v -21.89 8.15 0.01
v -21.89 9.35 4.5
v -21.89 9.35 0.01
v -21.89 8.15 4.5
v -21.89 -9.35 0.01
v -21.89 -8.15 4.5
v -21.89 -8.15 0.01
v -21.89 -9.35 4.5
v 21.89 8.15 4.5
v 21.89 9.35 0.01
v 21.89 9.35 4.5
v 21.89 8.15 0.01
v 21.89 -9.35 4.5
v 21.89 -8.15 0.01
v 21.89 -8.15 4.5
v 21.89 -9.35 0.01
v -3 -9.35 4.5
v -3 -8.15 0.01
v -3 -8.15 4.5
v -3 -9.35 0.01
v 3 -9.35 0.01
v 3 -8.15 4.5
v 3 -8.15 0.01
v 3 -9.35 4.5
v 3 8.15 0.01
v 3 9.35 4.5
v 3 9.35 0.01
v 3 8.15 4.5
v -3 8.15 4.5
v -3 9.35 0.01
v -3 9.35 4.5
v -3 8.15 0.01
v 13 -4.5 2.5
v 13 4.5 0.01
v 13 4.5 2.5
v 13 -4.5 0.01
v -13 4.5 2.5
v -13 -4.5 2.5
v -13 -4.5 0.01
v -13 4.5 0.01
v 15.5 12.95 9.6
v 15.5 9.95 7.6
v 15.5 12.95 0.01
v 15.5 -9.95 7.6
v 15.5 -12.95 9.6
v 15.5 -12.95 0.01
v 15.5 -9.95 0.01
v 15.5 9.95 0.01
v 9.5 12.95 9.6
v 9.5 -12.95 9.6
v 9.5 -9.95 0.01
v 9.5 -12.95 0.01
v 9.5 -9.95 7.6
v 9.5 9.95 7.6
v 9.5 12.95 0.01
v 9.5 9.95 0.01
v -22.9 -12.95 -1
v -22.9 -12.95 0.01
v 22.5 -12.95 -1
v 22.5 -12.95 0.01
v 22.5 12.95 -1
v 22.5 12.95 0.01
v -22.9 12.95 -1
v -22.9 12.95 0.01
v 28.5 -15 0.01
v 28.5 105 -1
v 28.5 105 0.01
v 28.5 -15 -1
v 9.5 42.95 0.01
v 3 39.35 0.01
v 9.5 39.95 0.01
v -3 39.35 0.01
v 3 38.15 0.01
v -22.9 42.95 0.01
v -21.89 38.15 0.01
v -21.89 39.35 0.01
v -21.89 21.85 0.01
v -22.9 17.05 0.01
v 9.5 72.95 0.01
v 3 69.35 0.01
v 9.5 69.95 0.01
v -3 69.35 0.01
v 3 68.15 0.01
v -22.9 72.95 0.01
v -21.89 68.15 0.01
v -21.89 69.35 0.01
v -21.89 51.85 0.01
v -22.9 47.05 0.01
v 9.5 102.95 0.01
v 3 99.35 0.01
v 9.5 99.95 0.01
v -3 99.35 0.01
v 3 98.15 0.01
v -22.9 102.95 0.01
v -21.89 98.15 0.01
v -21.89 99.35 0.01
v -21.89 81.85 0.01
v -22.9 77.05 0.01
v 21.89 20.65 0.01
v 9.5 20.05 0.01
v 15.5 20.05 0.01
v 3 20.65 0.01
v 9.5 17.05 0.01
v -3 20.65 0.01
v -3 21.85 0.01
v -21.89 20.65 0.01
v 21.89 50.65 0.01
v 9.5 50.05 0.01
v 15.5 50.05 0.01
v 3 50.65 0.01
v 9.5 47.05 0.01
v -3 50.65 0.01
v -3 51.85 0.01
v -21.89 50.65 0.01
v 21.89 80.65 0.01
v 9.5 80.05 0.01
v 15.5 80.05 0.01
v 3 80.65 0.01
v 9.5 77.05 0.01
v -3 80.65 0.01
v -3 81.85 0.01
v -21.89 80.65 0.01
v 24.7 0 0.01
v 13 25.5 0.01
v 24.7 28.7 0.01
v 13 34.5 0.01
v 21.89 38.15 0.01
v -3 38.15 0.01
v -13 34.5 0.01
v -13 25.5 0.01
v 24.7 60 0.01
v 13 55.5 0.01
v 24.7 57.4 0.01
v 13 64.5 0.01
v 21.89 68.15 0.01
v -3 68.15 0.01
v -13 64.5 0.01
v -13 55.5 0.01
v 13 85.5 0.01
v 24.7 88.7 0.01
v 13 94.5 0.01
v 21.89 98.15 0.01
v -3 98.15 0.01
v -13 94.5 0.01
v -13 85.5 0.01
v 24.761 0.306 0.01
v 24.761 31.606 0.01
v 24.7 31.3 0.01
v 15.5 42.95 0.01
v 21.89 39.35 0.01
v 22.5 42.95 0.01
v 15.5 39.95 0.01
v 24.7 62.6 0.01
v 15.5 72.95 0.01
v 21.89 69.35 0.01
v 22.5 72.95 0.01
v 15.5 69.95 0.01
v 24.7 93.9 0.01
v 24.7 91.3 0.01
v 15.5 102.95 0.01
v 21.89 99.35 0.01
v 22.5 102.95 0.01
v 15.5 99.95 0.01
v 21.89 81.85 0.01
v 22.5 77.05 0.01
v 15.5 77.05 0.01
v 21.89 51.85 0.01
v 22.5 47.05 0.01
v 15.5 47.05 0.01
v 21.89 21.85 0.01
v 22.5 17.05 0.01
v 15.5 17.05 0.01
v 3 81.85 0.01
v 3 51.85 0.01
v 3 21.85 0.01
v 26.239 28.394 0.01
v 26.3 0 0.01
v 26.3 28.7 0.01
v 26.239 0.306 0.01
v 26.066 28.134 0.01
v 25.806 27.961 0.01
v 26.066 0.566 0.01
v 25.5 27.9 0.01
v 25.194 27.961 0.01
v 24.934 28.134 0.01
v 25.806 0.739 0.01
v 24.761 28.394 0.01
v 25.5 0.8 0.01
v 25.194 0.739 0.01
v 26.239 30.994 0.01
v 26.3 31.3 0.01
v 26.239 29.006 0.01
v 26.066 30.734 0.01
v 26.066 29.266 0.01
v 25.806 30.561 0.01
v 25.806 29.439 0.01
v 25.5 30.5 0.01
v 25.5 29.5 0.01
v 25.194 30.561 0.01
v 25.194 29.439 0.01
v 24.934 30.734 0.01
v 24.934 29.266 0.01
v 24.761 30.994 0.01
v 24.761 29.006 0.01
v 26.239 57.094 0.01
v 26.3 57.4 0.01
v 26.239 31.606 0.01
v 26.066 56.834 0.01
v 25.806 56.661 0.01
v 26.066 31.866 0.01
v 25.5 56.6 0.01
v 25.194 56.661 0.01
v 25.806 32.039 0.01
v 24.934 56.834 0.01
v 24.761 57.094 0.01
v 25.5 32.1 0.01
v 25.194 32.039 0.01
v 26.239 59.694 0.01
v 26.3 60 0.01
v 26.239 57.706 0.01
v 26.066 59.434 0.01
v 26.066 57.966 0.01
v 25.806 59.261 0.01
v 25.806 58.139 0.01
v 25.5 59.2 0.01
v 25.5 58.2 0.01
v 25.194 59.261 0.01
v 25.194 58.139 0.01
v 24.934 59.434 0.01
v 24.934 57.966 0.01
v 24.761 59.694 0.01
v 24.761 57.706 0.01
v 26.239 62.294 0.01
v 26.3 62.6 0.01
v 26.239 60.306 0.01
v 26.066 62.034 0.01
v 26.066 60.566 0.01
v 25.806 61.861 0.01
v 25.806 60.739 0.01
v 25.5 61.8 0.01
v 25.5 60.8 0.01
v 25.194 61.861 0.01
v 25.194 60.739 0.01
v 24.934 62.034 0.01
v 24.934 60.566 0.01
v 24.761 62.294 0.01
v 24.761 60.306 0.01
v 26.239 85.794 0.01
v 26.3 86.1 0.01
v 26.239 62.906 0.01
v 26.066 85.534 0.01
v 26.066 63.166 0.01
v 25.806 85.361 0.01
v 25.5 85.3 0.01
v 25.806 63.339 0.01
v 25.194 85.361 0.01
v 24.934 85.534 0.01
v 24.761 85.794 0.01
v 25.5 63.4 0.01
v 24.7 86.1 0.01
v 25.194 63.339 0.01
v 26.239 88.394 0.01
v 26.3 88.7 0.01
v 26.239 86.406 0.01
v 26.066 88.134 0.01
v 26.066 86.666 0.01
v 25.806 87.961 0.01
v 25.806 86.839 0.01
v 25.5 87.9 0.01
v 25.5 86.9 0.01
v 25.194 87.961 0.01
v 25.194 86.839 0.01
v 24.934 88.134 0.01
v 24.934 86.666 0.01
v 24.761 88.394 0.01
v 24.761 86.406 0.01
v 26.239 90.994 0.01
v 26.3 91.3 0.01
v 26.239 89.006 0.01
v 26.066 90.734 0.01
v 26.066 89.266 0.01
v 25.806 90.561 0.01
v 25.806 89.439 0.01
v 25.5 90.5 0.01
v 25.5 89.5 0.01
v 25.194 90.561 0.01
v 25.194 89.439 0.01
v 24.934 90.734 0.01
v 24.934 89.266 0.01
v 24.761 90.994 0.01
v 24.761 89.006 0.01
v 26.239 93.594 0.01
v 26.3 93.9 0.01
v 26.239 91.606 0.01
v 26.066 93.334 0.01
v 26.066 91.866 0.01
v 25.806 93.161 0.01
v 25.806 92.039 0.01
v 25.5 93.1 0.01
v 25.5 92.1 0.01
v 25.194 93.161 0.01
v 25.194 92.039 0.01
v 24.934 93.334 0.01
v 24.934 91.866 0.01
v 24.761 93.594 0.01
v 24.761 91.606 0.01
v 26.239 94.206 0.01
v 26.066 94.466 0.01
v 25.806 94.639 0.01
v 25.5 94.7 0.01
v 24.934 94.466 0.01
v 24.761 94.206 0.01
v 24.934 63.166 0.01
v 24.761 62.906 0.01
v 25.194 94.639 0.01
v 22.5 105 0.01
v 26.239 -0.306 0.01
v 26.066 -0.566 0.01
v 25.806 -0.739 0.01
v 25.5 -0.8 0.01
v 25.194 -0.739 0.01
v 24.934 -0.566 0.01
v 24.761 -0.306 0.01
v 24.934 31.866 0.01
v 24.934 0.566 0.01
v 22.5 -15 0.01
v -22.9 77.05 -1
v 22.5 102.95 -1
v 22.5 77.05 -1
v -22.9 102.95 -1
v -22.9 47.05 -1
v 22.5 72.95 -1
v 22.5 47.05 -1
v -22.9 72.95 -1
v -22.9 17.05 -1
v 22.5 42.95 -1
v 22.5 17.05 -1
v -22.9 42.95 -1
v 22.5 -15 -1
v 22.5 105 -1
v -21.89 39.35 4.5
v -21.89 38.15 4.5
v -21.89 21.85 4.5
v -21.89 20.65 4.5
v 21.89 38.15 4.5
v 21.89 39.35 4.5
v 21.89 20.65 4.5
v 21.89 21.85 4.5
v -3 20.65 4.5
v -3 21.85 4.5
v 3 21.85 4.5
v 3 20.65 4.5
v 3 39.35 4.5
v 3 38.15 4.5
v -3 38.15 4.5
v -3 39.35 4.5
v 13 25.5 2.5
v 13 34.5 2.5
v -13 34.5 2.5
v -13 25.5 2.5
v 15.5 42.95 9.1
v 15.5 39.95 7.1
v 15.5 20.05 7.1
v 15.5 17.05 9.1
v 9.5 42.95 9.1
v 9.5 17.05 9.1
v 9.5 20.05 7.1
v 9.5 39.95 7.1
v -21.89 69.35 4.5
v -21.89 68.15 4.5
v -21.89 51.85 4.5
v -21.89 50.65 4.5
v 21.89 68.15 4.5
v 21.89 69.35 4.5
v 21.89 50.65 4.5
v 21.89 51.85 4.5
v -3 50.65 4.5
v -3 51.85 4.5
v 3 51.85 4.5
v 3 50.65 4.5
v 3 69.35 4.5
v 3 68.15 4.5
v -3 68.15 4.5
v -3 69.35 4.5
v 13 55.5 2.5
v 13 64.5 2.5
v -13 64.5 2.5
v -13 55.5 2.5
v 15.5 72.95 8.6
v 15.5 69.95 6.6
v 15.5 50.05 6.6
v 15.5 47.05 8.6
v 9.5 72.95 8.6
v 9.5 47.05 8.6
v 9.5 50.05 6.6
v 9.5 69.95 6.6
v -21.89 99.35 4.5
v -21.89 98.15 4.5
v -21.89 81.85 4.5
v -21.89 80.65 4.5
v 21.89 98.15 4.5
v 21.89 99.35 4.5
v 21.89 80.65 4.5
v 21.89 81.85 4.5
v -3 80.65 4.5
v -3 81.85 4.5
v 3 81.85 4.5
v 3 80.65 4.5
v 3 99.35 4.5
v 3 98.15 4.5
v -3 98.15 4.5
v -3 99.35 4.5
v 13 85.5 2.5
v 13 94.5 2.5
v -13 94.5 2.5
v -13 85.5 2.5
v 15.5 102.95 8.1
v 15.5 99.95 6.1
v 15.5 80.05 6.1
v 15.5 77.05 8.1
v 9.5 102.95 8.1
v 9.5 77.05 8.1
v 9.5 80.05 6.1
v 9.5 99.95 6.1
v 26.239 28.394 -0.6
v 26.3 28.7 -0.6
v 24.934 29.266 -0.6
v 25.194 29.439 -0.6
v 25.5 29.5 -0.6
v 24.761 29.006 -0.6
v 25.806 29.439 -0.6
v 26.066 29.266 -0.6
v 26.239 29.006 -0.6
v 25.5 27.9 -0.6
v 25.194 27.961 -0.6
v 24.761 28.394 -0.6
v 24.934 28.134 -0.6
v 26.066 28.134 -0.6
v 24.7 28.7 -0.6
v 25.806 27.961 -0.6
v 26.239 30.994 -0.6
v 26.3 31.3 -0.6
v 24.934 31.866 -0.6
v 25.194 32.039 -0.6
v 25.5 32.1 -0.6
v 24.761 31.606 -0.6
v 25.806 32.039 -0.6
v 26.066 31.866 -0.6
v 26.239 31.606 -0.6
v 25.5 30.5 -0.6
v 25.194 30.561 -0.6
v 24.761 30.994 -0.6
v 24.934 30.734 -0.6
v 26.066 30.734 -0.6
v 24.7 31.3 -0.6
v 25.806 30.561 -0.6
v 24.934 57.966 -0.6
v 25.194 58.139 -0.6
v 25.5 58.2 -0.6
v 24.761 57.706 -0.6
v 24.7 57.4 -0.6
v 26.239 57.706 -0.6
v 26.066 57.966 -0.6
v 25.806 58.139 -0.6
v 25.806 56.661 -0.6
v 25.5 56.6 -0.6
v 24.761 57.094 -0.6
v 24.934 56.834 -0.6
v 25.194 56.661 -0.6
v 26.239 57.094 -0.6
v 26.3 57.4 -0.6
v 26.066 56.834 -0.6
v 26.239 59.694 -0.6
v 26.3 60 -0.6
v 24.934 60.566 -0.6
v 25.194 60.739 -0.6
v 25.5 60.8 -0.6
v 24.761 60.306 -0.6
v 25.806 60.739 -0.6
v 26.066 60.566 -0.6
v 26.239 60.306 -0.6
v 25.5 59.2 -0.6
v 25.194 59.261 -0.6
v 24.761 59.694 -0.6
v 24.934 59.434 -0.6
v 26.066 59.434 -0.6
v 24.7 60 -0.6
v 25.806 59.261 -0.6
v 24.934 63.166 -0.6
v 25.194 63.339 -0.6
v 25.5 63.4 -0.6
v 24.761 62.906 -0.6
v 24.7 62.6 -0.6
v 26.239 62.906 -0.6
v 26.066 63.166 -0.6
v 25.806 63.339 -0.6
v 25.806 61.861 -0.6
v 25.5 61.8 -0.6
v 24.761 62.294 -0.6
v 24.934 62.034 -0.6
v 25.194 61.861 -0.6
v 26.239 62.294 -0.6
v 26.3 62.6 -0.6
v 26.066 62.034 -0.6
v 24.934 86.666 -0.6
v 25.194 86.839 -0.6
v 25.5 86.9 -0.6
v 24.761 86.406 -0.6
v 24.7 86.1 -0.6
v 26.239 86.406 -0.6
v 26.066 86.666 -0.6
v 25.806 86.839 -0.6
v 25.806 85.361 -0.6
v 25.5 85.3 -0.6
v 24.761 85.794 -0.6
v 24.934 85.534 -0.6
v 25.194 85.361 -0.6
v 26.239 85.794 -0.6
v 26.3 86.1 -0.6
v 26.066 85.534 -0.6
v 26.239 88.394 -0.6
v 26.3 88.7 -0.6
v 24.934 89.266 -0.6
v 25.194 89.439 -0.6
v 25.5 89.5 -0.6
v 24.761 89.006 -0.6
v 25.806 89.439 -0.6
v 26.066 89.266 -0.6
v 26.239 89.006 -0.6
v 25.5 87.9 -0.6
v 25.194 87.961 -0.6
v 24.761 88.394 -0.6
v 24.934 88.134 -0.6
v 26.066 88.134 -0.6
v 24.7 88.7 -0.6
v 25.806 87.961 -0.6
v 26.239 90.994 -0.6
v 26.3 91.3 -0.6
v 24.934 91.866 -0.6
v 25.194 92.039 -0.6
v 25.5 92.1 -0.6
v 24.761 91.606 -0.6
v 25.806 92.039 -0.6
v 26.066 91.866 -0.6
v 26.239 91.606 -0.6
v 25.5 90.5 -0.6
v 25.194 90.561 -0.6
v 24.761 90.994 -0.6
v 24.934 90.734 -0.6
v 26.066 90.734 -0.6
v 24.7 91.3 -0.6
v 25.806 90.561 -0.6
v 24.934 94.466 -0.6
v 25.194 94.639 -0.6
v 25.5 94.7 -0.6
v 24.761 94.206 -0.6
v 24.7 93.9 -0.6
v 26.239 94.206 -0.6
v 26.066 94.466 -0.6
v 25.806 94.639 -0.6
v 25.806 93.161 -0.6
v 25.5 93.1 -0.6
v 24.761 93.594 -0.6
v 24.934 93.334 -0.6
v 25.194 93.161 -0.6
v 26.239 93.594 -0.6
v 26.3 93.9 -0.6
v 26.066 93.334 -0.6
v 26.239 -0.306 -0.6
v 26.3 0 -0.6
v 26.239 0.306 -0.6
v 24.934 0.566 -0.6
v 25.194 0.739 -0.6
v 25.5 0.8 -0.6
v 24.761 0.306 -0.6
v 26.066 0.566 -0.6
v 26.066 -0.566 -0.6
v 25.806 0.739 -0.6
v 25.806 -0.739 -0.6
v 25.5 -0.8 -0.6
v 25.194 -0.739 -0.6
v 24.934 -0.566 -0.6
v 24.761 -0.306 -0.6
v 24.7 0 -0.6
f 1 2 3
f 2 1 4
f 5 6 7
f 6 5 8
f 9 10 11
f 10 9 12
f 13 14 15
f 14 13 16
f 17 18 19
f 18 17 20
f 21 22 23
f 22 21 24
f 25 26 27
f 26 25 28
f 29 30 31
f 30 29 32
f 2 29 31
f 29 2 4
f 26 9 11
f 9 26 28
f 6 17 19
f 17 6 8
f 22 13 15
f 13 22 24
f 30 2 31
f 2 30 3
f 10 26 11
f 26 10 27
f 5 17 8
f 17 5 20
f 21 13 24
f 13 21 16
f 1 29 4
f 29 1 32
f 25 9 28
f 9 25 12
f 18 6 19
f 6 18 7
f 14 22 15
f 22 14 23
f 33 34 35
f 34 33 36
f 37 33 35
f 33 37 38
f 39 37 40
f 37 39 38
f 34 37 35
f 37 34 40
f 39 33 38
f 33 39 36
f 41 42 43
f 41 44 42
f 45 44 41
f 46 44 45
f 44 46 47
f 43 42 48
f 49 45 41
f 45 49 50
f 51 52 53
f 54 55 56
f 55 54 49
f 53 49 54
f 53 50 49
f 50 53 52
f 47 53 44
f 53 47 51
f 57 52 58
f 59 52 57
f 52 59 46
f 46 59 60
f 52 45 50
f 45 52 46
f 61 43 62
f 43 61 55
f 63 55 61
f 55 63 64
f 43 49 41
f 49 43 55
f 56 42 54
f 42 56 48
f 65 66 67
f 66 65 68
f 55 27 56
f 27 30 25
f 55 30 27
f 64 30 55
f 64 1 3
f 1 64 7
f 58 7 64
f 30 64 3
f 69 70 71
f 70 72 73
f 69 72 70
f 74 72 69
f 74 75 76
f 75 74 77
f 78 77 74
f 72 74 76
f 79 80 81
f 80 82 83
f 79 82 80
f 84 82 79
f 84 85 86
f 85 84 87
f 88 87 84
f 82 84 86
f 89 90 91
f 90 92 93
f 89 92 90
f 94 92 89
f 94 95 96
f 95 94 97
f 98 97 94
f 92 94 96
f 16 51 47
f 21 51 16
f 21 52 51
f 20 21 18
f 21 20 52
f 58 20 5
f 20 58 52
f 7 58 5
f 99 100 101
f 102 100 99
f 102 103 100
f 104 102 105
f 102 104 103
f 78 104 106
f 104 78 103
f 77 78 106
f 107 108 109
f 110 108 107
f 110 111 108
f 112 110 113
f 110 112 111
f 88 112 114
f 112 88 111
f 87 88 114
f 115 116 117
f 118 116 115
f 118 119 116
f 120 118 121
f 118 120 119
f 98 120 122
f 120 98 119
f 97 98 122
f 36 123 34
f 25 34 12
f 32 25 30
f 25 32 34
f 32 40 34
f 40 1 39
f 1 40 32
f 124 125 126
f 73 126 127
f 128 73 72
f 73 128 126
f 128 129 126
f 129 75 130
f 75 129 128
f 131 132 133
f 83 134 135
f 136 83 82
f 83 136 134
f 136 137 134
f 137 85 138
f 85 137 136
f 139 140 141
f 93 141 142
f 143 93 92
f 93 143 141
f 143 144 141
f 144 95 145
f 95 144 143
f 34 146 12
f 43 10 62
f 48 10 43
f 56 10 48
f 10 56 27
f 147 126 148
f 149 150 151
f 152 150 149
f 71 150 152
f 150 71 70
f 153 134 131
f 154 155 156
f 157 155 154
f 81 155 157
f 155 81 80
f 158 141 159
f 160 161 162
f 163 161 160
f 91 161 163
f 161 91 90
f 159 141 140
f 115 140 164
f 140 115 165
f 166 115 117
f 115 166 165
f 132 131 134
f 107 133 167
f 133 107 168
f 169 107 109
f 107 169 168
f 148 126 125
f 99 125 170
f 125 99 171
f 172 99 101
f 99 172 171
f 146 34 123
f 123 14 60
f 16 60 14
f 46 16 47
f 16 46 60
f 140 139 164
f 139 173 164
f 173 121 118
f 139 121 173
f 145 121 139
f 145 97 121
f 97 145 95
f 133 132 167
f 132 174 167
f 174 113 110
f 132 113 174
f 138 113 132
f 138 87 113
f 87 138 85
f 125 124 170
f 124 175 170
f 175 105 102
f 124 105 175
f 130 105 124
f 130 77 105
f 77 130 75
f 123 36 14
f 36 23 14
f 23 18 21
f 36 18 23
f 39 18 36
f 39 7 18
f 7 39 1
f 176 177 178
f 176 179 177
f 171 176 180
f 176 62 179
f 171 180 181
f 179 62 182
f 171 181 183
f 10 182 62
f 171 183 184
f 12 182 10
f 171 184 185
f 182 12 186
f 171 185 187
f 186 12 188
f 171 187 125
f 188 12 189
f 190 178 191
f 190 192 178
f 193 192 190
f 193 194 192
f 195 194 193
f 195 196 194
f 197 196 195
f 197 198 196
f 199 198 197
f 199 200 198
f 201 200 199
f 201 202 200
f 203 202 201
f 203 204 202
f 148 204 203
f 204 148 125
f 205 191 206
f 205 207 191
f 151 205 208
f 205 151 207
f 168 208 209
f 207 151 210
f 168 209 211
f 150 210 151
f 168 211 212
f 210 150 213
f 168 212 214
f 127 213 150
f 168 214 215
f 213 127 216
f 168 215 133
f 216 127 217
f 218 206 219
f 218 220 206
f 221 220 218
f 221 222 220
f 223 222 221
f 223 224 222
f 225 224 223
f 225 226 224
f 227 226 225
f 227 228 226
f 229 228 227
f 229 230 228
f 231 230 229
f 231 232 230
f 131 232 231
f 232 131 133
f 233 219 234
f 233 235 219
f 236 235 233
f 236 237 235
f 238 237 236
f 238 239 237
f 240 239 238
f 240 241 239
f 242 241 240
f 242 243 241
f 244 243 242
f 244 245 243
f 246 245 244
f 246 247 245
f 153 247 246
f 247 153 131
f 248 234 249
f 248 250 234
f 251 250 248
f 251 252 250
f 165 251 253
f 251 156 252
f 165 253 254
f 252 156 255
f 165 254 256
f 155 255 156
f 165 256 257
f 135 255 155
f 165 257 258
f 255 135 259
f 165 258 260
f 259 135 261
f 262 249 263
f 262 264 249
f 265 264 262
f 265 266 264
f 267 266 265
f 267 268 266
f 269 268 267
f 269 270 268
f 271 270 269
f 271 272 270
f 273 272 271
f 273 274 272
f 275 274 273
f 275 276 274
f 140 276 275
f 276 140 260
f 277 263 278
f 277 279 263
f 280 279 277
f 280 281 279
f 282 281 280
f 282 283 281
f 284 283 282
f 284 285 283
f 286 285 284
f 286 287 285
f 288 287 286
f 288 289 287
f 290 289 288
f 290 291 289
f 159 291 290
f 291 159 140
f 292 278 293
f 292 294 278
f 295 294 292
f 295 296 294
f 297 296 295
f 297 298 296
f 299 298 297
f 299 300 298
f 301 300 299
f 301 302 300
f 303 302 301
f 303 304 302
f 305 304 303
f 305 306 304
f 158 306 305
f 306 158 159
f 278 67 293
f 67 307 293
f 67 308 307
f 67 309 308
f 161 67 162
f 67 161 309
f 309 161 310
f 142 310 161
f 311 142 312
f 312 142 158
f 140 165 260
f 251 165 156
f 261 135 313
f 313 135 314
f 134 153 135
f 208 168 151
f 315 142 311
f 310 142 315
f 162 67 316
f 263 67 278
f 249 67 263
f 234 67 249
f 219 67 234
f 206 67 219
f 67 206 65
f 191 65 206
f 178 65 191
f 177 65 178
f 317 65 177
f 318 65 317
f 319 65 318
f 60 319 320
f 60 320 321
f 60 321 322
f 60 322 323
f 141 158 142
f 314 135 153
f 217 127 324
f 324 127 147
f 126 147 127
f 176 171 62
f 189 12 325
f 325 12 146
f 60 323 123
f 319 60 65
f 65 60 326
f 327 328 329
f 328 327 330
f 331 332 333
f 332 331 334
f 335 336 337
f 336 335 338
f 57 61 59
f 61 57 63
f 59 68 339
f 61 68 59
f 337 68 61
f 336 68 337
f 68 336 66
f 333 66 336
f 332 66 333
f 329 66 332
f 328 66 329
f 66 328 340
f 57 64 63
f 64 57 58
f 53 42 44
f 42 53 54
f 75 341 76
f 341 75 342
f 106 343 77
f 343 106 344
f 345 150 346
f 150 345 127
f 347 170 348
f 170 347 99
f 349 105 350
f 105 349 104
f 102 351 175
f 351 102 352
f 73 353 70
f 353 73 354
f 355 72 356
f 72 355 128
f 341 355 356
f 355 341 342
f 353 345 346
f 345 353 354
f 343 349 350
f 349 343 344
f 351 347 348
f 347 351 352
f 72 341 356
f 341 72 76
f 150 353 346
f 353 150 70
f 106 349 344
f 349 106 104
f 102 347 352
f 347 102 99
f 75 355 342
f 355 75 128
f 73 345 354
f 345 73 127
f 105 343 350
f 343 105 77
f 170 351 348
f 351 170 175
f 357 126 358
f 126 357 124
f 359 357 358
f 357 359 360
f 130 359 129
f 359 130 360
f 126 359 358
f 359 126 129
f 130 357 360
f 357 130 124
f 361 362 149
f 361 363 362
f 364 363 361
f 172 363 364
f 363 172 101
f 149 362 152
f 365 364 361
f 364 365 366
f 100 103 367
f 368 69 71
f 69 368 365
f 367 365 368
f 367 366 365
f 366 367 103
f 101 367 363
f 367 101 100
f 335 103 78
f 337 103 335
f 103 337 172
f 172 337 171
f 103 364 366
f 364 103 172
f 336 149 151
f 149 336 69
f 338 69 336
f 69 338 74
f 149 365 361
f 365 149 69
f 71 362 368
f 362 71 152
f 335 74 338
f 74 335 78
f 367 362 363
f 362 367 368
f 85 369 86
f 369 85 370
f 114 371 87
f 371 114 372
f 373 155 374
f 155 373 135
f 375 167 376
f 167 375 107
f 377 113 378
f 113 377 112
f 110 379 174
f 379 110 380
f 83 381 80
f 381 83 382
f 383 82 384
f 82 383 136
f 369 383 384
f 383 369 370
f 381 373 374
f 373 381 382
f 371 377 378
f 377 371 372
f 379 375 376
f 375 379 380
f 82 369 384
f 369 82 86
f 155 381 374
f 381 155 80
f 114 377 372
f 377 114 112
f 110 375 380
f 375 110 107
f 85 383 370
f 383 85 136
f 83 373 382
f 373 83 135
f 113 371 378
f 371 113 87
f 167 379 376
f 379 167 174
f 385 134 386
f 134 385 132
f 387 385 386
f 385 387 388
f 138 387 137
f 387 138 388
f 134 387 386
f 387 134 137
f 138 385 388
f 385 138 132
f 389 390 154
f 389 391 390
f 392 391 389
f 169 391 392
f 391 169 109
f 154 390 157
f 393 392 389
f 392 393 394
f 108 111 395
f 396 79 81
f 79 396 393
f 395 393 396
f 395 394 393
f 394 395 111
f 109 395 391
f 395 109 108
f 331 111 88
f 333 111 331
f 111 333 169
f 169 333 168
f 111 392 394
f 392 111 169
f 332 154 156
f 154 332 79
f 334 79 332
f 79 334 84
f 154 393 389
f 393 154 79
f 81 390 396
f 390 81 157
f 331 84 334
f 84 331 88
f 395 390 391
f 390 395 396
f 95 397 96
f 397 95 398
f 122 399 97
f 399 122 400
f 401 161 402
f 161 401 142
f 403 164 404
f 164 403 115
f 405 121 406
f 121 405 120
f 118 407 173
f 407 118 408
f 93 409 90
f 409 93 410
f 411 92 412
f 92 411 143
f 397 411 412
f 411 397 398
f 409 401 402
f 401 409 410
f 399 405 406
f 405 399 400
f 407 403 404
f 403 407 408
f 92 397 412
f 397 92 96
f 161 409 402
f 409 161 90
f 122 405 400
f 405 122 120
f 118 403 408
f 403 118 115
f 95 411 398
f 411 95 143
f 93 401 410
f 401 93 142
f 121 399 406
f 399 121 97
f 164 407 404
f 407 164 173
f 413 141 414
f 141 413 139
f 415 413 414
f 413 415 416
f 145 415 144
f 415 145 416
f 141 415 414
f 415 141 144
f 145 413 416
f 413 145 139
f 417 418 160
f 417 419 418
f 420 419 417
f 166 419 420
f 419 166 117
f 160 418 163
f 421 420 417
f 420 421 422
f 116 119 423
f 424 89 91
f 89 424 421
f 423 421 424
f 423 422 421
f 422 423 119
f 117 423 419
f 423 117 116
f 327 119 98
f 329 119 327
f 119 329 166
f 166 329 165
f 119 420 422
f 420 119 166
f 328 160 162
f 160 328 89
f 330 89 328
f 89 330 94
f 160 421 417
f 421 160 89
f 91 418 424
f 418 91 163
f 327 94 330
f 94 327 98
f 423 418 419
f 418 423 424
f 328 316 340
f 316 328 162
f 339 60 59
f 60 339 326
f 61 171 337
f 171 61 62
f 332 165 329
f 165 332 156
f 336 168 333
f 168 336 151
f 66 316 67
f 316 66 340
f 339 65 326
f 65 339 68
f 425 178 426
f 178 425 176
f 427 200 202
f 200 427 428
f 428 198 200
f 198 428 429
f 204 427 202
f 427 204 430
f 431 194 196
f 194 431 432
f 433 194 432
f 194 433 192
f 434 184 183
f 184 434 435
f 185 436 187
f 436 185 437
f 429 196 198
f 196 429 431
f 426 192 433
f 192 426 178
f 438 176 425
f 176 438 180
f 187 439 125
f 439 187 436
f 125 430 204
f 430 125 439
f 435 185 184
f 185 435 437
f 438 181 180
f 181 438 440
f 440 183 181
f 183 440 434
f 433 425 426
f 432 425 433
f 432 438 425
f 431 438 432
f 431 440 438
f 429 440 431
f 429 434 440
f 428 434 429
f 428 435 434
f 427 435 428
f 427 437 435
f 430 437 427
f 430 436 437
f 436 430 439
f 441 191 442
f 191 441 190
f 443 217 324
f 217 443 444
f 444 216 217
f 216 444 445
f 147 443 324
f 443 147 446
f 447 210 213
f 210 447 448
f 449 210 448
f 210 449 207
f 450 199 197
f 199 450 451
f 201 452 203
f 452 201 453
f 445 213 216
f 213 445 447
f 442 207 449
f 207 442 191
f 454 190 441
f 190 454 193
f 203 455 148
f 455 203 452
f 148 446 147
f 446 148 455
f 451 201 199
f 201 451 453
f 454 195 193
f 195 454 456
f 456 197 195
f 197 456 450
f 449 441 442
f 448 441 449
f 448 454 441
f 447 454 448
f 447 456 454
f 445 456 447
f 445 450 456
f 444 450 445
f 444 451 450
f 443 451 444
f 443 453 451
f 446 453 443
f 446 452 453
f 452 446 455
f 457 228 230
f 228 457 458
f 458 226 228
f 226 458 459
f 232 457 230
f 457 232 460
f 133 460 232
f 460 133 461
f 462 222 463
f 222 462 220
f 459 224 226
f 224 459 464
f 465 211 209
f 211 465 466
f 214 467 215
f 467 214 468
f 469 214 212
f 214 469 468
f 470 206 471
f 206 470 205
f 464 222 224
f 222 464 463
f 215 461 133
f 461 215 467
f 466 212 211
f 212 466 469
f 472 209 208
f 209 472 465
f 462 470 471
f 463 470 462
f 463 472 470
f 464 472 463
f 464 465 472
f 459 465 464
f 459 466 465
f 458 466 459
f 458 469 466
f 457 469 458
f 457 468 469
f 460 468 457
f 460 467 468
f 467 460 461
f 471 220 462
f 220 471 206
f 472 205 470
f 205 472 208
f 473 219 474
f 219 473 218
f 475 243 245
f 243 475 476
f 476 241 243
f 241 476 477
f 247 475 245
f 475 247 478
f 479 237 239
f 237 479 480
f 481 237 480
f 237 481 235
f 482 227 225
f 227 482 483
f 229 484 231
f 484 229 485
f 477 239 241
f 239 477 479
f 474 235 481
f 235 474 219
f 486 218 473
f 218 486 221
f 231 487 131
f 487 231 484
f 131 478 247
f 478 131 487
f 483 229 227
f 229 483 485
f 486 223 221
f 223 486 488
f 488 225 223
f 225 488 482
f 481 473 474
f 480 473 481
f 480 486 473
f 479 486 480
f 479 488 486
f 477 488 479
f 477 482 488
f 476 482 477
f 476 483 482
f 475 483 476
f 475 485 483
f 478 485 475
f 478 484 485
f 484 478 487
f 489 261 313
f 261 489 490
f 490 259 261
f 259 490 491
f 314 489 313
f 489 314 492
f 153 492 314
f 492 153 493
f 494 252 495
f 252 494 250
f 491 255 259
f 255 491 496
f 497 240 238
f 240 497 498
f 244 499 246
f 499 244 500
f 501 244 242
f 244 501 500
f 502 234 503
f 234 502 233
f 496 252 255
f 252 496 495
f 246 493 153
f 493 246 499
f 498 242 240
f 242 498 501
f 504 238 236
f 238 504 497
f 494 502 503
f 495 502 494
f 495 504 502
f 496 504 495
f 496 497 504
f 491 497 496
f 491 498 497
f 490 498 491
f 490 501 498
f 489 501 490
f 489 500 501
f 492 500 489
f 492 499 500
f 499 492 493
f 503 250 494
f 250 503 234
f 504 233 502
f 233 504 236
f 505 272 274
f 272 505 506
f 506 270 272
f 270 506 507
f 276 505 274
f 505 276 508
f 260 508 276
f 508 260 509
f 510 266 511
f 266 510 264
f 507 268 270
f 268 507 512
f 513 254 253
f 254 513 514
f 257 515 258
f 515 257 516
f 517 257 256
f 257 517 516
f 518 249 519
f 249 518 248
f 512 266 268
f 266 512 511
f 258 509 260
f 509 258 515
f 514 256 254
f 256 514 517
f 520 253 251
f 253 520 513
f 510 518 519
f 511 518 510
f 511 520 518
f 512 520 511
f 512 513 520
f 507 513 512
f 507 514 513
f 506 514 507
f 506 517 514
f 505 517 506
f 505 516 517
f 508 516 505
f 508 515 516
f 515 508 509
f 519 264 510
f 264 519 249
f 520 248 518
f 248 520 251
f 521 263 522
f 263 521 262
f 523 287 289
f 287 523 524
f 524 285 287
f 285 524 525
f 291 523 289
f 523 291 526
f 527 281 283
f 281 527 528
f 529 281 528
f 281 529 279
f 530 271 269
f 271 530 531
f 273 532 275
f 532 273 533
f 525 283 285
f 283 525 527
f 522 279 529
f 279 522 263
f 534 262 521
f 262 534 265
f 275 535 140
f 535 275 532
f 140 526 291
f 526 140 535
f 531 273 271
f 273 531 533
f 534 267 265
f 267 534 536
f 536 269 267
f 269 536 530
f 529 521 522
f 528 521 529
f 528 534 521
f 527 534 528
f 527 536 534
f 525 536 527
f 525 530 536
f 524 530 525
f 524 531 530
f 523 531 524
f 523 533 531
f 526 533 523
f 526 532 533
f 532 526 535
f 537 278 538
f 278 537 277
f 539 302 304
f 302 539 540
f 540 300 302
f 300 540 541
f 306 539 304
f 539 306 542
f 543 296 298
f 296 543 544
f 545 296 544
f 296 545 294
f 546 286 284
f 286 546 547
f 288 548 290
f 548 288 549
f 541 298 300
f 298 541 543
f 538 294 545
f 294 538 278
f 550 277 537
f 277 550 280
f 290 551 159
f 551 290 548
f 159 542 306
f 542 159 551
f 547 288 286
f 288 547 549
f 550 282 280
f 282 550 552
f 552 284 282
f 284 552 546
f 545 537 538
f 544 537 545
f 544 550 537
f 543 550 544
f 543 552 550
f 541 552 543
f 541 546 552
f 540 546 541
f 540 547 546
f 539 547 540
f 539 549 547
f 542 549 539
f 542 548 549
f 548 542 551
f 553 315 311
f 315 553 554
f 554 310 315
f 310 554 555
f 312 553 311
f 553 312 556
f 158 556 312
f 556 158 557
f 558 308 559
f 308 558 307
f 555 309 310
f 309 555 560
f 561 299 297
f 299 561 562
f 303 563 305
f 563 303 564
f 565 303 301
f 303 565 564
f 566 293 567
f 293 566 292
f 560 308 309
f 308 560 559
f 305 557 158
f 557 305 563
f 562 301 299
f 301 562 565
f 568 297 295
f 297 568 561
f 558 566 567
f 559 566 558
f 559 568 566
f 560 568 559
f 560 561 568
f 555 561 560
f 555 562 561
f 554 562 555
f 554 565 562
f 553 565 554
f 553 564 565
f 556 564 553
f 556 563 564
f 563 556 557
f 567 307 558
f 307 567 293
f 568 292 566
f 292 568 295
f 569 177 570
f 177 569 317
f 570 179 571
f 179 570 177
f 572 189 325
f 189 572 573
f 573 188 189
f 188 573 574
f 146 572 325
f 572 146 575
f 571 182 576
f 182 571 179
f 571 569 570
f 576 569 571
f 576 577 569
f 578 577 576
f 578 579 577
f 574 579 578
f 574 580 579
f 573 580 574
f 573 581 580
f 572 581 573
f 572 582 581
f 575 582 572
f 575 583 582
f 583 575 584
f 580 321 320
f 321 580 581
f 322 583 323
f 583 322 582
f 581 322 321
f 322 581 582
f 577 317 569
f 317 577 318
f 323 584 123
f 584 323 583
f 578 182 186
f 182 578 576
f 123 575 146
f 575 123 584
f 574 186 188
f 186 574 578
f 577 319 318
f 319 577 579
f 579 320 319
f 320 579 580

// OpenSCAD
// file: ../board-pocket/board-pocket.scad
//-----------------------------------------------------------------------
// Board pocket: holds a board that has no mounting holes
//
// The board sits on a central pedestal with a pad of double-sided foam tape
// on top, inside a low wall that follows its outline. The pedestal keeps
// the board's edges off the floor, so lead stubs soldered through the edge
// holes have room underneath; gaps in the wall let the leads out. The wall
// only locates the board: the tape holds it down, and in a closed box a lid
// pad presses a pad of foam onto it (boardLidPad below).
//
// Modules, all in the same frame:
//   boardPocketGhost()   the board and its tape, for previews
//   boardPocketHolder()  the plastic: pedestal and outline wall, add to the floor
//   boardLidPad()        a block hanging from the lid that presses foam onto the board
//   boardLidPadGhost()   the foam under it, squashed, for previews
//
// Frame: origin on the floor top, under the centre of the board's outline.
// X along the board's length l, Y across its width w, Z up. Units: mm.
//
// Sides are listed [-X, +X, -Y, +Y], each one of
//   "gap"    wall with a gap in the middle for leads (gapW wide)
//   "solid"  whole wall: use it where the board takes a push (a plug)
//   "open"   no wall: the board's edge goes into a box wall (a USB port)
//
// Used by esp32-c3-supermini, esp32-s3-devkitc and rs485-max485.
//-----------------------------------------------------------------------

//-- From the controller project's receiver.scad / rack-end.scad (boardPocket), 2026-10-30
bpPedestal  = 2.5;     // floor to the tape: room for lead stubs under the board edges
bpTape      = 1.0;     // double-sided foam tape on the pedestal. CAL: how far it squashes
bpWall      = 1.2;     // outline wall thickness
bpRise      = 1.0;     // wall top above the PCB underside (the controller project's rack-end: 0.8 under the S3's module)
bpClearance = 0.4;     // per side, board outline to wall: PETG. 0.3 for PLA. Set by the fit piece
bpGapW      = 6;       // lead gap in a "gap" side
bpPadInset  = 4;       // default pedestal: the board less this all round

//-- Lid hold-down (the controller project's receiver / rack-end lid pads)
bpFoam      = 3.0;     // CAL: self-adhesive foam stuck under each lid pad
bpSqueeze   = 1.0;     // how far the lid squashes it: ~1/3 for soft foam, 0.3 for felt

//-- PCB underside above the floor top
function boardPocketZ(pedestal = bpPedestal, tape = bpTape) = pedestal + tape;
//-- default pedestal [l, w] for a board
function boardPocketPad(l, w, inset = bpPadInset) = [max(l - 2*inset, 4), max(w - 2*inset, 4)];
//-- Z of a lid pad's underside, pressing on a surface at surfaceZ (board top, or a part on it)
function boardLidPadZ(surfaceZ, foam = bpFoam, squeeze = bpSqueeze) =
  assert(squeeze > 0 && squeeze < foam, "foam would not touch the board")
  surfaceZ + foam - squeeze;

function bpSides4(s) = is_list(s) ? s : [s, s, s, s];

module boardPocketGhost(l, w, pcb = 1.6, pad, pedestal = bpPedestal, tape = bpTape)
{
  p = is_undef(pad) ? boardPocketPad(l, w) : pad;
  %color("White") translate([-p[0]/2, -p[1]/2, pedestal]) cube([p[0], p[1], tape]);
  %color("DarkGreen") translate([-l/2, -w/2, pedestal + tape]) cube([l, w, pcb]);
}

//-- pad: pedestal [l, w]; gapW a number or one per side
module boardPocketHolder(l, w, pad, sides = "gap", gapW = bpGapW, clearance = bpClearance,
                         pedestal = bpPedestal, tape = bpTape, wall = bpWall, rise = bpRise)
{
  p   = is_undef(pad) ? boardPocketPad(l, w) : pad;
  s   = bpSides4(sides);
  g   = bpSides4(gapW);
  ix  = l/2 + clearance;                 // inner half sizes
  iy  = w/2 + clearance;
  top = pedestal + tape + rise;
  assert(p[0] <= l && p[1] <= w, "pedestal bigger than the board");
  for (k = s) assert(k == "gap" || k == "solid" || k == "open", str("unknown side ", k));

  //-- pedestal, centred under the board
  translate([-p[0]/2, -p[1]/2, -0.01]) cube([p[0], p[1], pedestal + 0.01]);
  //-- outline wall
  difference()
  {
    translate([-ix - wall, -iy - wall, -0.01]) cube([2*(ix + wall), 2*(iy + wall), top + 0.01]);
    translate([-ix, -iy, -1]) cube([2*ix, 2*iy, top + 2]);
    for (i = [0 : 3])
    {
      //-- each side's cut, drawn for -X then turned into place
      ax = (i < 2) ? ix : iy;         // inner half size across the side
      al = (i < 2) ? iy : ix;         // half length along it
      rotate([0, 0, [0, 180, 90, 270][i]])   // -X, +X, -Y, +Y
      {
        if (s[i] == "gap")
          translate([-ax - wall - 1, -g[i]/2, -1]) cube([wall + 2, g[i], top + 2]);
        if (s[i] == "open")
          translate([-ax - wall - 1, -al - wall - 1, -1]) cube([wall + 1.01, 2*(al + wall + 1), top + 2]);
      }
    }
  }
}

//-- A lid pad over the rectangle size [x, y] centred at `at`, from the squashed foam up to
//-- lidZ (the lid's inner face in this frame), running `into` up into the lid plate
module boardLidPad(size, at = [0, 0], surfaceZ, lidZ, foam = bpFoam, squeeze = bpSqueeze, into = 0.5)
{
  z0 = boardLidPadZ(surfaceZ, foam, squeeze);
  assert(lidZ > z0, "lid is below the pad: the box is too low for the foam");
  translate([at[0] - size[0]/2, at[1] - size[1]/2, z0]) cube([size[0], size[1], lidZ - z0 + into]);
}

module boardLidPadGhost(size, at = [0, 0], surfaceZ, foam = bpFoam, squeeze = bpSqueeze)
{
  %color("Gray") translate([at[0] - size[0]/2, at[1] - size[1]/2, surfaceZ]) cube([size[0], size[1], foam - squeeze]);
}
// file: ../../util/marks.scad
//-----------------------------------------------------------------------
// Marks for fit pieces: n dots in a row, engraved into a face, so each
// variant can be told apart after printing. Origin: centre of the row, on
// the face; the dots cut down into -Z. Units: mm.
//-----------------------------------------------------------------------

markDotDia   = 1.6;
markDotPitch = 2.6;
markDotDepth = 0.6;

module markDots(n)
{
  for (i = [0 : n - 1])
    translate([(i - (n - 1)/2)*markDotPitch, 0, -markDotDepth])
      cylinder(d = markDotDia, h = markDotDepth + 1, $fn = 16);
}
// file: rs485-max485.scad
//-----------------------------------------------------------------------
// TTL-to-RS485 module (MAX485 and friends), on the floor
//
// These modules have no mounting holes. The board sits on a taped pedestal
// inside an outline pocket (board-pocket), with lead gaps at both ends (bus
// end and logic end) and in the long sides. In a closed box two lid pads
// press foam onto it, one inboard of each end's pin row.
//
// Modules, all in the same frame:
//   rs485Ghost()     the board, its chips, pin holes and any screw terminal
//   rs485Holder()    the plastic: pedestal and outline pocket, add to the floor
//   rs485LidPads()   blocks under the lid that press foam onto the board
//
// Frame: origin on the floor top under the centre of the board. X along the
// board, bus end (A/B) at -X, logic end (VCC/TXD/RXD/GND) at +X. Z up. Units: mm.
//
// Sizes: pick a row of rs485Variants by name.
//-----------------------------------------------------------------------

//-- included, not used, so its default values (bpTape, bpClearance...) are in scope here
include <../board-pocket/board-pocket.scad>

//-- [name, length, width, pcb, tallest SMD, bus pins, logic pins, screw terminal [l, w, h] or undef]
rs485Variants = [
  //-- JZK 5-pack B09VGJCJKQ, auto-direction (MAX485 + CD4069). Outline measured 2026-10-21;
  //-- PCB CAL (probably 1.6). Bus end: A+ B- earth, bare holes. Logic: VCC TXD RXD GND
  ["jzk",    43.0, 15.5,  1.6, 2.0, 3, 4, undef],
  //-- XY-017 auto-direction (WINGONEER manual, manuals.plus/asin/B06XHH6B6R): 42.8 x 15.22 x 0.8.
  //-- Looks like the same family as the JZK; pin counts CAL
  ["xy-017", 42.8, 15.22, 0.8, 2.0, 3, 4, undef],
  //-- Classic blue MAX485 module (HW-0519 style): 44 x 14 on most listings (some 45 x 15, 46 x 12),
  //-- 4-pin header each end (RO RE DE DI / VCC B A GND), 2-way 5.08 screw terminal at the bus end.
  //-- PCB, terminal size and its place on the board CAL
  ["max485", 44.0, 14.0,  1.6, 2.0, 4, 4, [7.5, 10.2, 10.0]],
];
rs485Variant  = "jzk";

rs485PinPitch = 2.54;
rs485PinEnd   = 1.5;      // CAL: pin row centre from the board's end
rs485ChipSize = [5.0, 6.0, 1.75];   // SOIC-8, ghost only; placed either side of the middle (CAL)
//-- Holder (the controller project's receiver.scad / rack-end.scad)
rs485PadEnd   = 8.5;      // pedestal stops this far from each end: clear of the pin stubs
rs485PadSide  = 3.25;     // and this far from each long side (26 x 9 on the JZK)
rs485EndGap   = 10;       // lead gap at the ends: the 4-pin row is 7.62 across, plus wire
rs485SideGap  = 6;
rs485PadInset = 6;        // lid pads: this far inboard of each end
rs485PadLen   = 6;

function rs485(name = rs485Variant) = let (i = search([name], rs485Variants)[0])
  assert(i != [] && i != undef, str("unknown RS485 variant ", name)) rs485Variants[i];
function rs485Pad(variant = rs485Variant) = let (v = rs485(variant))
  [v[1] - 2*rs485PadEnd, v[2] - 2*rs485PadSide];
//-- PCB top above the floor
function rs485Top(variant = rs485Variant, pedestal = bpPedestal, tape = bpTape) =
  boardPocketZ(pedestal, tape) + rs485(variant)[3];

module rs485Ghost(variant = rs485Variant, pedestal = bpPedestal, tape = bpTape)
{
  v   = rs485(variant);
  top = rs485Top(variant, pedestal, tape);
  boardPocketGhost(v[1], v[2], v[3], rs485Pad(variant), pedestal, tape);
  for (x = [-1, 1])
    %color("Black") translate([x*5 - rs485ChipSize[0]/2, -rs485ChipSize[1]/2, top]) cube(rs485ChipSize);
  //-- pin rows across each end
  for (e = [[-1, v[5]], [1, v[6]]], i = [0 : e[1] - 1])
    %color("Gold") translate([e[0]*(v[1]/2 - rs485PinEnd), (i - (e[1] - 1)/2)*rs485PinPitch, top - v[3] - 0.01])
      cylinder(d = 1.0, h = v[3] + 0.02, $fn = 12);
  if (!is_undef(v[7]))
    %color("RoyalBlue") translate([-v[1]/2 + 3, -v[7][1]/2, top]) cube(v[7]);
}

module rs485Holder(variant = rs485Variant, sides = "gap", clearance = bpClearance,
                   pedestal = bpPedestal, tape = bpTape, rise = bpRise)
{
  v = rs485(variant);
  boardPocketHolder(v[1], v[2], rs485Pad(variant), sides,
                    [rs485EndGap, rs485EndGap, rs485SideGap, rs485SideGap],
                    clearance, pedestal, tape, bpWall, rise);
}

//-- lidZ: the lid's inner face above the floor top. With a screw terminal, the bus-end pad
//-- moves inboard of it
module rs485LidPads(lidZ, variant = rs485Variant, foam = bpFoam, squeeze = bpSqueeze,
                    pedestal = bpPedestal, tape = bpTape)
{
  v   = rs485(variant);
  top = rs485Top(variant, pedestal, tape);
  busIn = is_undef(v[7]) ? rs485PadInset : 3 + v[7][0] + 1;
  for (x = [-v[1]/2 + busIn + rs485PadLen/2, v[1]/2 - rs485PadInset - rs485PadLen/2])
    boardLidPad([rs485PadLen, v[2] - 3], [x, 0], top, lidZ, foam, squeeze);
}
// main file
//-----------------------------------------------------------------------
// Fit piece: four RS485 pockets, each with a bridge across it where a lid
// pad would be, marked 1 to 4 dots at the far end. Stick a 3 mm foam pad
// under each bridge; the stations vary how far the foam gets squashed on
// the board, so they also show up a PCB thinner or thicker than 1.6.
//
//   1  squeeze 0.5
//   2  squeeze 1.0   (the design value)
//   3  squeeze 1.5
//   4  squeeze 2.0
//
// The pocket ends are open: put tape on the pedestal with its liner on and
// slide the board in from the bus end (-X), under the foam. Which one holds
// the board firmly without bowing it, and still lets it slide in?
// The real holder has end walls (rs485Holder); this one leaves them off so
// the board can go in under the bridge.
// Prints base down, as exported, no supports (the bridges span about 20).
// Units: mm.
//-----------------------------------------------------------------------

include <rs485-max485.scad>
use <../../util/marks.scad>

foam      = 3.0;      // CAL: the foam you'll use
squeezes  = [0.5, 1.0, 1.5, 2.0];
baseThick = 1.0;
pitch     = 30;
barT      = 2.0;      // bridge thickness
pillar    = 3.0;      // pillar width across Y

v      = rs485();
n      = len(squeezes);
iy     = v[2]/2 + bpClearance;            // pocket inner half width
py     = iy + bpWall + 0.6;               // pillars' inner faces
padX   = v[1]/2 - rs485PadInset - rs485PadLen/2;   // logic-end lid pad, as in rs485LidPads
top    = rs485Top();
x0     = -v[1]/2 - bpClearance - 1;
x1     = v[1]/2 + 7;

difference()
{
  union()
  {
    for (i = [0 : n - 1])
      translate([0, i*pitch, 0])
      {
        translate([x0, -py - pillar, -baseThick]) cube([x1 - x0, 2*(py + pillar), baseThick + 0.01]);
        rs485Holder(sides = ["open", "open", "gap", "gap"]);
        //-- bridge: pillars either side, bar across at the lid pad's height
        z0 = boardLidPadZ(top, foam, squeezes[i]);
        for (m = [-1, 1])
          translate([padX - rs485PadLen/2, m > 0 ? py : -py - pillar, -0.01]) cube([rs485PadLen, pillar, z0 + barT + 0.01]);
        translate([padX - rs485PadLen/2, -py - pillar, z0]) cube([rs485PadLen, 2*(py + pillar), barT]);
      }
    //-- spine joining the stations
    translate([x1 - 6, -pitch/2, -baseThick]) cube([6, n*pitch, baseThick + 0.01]);
  }
  for (i = [0 : n - 1])
    translate([x1 - 3, i*pitch, 0]) rotate([0, 0, 90]) markDots(i + 1);
}

if ($preview)
  for (i = [0 : n - 1])
    translate([0, i*pitch, 0])
    {
      rs485Ghost();
      boardLidPadGhost([rs485PadLen, v[2] - 3], [padX, 0], top, foam, squeezes[i]);
    }
